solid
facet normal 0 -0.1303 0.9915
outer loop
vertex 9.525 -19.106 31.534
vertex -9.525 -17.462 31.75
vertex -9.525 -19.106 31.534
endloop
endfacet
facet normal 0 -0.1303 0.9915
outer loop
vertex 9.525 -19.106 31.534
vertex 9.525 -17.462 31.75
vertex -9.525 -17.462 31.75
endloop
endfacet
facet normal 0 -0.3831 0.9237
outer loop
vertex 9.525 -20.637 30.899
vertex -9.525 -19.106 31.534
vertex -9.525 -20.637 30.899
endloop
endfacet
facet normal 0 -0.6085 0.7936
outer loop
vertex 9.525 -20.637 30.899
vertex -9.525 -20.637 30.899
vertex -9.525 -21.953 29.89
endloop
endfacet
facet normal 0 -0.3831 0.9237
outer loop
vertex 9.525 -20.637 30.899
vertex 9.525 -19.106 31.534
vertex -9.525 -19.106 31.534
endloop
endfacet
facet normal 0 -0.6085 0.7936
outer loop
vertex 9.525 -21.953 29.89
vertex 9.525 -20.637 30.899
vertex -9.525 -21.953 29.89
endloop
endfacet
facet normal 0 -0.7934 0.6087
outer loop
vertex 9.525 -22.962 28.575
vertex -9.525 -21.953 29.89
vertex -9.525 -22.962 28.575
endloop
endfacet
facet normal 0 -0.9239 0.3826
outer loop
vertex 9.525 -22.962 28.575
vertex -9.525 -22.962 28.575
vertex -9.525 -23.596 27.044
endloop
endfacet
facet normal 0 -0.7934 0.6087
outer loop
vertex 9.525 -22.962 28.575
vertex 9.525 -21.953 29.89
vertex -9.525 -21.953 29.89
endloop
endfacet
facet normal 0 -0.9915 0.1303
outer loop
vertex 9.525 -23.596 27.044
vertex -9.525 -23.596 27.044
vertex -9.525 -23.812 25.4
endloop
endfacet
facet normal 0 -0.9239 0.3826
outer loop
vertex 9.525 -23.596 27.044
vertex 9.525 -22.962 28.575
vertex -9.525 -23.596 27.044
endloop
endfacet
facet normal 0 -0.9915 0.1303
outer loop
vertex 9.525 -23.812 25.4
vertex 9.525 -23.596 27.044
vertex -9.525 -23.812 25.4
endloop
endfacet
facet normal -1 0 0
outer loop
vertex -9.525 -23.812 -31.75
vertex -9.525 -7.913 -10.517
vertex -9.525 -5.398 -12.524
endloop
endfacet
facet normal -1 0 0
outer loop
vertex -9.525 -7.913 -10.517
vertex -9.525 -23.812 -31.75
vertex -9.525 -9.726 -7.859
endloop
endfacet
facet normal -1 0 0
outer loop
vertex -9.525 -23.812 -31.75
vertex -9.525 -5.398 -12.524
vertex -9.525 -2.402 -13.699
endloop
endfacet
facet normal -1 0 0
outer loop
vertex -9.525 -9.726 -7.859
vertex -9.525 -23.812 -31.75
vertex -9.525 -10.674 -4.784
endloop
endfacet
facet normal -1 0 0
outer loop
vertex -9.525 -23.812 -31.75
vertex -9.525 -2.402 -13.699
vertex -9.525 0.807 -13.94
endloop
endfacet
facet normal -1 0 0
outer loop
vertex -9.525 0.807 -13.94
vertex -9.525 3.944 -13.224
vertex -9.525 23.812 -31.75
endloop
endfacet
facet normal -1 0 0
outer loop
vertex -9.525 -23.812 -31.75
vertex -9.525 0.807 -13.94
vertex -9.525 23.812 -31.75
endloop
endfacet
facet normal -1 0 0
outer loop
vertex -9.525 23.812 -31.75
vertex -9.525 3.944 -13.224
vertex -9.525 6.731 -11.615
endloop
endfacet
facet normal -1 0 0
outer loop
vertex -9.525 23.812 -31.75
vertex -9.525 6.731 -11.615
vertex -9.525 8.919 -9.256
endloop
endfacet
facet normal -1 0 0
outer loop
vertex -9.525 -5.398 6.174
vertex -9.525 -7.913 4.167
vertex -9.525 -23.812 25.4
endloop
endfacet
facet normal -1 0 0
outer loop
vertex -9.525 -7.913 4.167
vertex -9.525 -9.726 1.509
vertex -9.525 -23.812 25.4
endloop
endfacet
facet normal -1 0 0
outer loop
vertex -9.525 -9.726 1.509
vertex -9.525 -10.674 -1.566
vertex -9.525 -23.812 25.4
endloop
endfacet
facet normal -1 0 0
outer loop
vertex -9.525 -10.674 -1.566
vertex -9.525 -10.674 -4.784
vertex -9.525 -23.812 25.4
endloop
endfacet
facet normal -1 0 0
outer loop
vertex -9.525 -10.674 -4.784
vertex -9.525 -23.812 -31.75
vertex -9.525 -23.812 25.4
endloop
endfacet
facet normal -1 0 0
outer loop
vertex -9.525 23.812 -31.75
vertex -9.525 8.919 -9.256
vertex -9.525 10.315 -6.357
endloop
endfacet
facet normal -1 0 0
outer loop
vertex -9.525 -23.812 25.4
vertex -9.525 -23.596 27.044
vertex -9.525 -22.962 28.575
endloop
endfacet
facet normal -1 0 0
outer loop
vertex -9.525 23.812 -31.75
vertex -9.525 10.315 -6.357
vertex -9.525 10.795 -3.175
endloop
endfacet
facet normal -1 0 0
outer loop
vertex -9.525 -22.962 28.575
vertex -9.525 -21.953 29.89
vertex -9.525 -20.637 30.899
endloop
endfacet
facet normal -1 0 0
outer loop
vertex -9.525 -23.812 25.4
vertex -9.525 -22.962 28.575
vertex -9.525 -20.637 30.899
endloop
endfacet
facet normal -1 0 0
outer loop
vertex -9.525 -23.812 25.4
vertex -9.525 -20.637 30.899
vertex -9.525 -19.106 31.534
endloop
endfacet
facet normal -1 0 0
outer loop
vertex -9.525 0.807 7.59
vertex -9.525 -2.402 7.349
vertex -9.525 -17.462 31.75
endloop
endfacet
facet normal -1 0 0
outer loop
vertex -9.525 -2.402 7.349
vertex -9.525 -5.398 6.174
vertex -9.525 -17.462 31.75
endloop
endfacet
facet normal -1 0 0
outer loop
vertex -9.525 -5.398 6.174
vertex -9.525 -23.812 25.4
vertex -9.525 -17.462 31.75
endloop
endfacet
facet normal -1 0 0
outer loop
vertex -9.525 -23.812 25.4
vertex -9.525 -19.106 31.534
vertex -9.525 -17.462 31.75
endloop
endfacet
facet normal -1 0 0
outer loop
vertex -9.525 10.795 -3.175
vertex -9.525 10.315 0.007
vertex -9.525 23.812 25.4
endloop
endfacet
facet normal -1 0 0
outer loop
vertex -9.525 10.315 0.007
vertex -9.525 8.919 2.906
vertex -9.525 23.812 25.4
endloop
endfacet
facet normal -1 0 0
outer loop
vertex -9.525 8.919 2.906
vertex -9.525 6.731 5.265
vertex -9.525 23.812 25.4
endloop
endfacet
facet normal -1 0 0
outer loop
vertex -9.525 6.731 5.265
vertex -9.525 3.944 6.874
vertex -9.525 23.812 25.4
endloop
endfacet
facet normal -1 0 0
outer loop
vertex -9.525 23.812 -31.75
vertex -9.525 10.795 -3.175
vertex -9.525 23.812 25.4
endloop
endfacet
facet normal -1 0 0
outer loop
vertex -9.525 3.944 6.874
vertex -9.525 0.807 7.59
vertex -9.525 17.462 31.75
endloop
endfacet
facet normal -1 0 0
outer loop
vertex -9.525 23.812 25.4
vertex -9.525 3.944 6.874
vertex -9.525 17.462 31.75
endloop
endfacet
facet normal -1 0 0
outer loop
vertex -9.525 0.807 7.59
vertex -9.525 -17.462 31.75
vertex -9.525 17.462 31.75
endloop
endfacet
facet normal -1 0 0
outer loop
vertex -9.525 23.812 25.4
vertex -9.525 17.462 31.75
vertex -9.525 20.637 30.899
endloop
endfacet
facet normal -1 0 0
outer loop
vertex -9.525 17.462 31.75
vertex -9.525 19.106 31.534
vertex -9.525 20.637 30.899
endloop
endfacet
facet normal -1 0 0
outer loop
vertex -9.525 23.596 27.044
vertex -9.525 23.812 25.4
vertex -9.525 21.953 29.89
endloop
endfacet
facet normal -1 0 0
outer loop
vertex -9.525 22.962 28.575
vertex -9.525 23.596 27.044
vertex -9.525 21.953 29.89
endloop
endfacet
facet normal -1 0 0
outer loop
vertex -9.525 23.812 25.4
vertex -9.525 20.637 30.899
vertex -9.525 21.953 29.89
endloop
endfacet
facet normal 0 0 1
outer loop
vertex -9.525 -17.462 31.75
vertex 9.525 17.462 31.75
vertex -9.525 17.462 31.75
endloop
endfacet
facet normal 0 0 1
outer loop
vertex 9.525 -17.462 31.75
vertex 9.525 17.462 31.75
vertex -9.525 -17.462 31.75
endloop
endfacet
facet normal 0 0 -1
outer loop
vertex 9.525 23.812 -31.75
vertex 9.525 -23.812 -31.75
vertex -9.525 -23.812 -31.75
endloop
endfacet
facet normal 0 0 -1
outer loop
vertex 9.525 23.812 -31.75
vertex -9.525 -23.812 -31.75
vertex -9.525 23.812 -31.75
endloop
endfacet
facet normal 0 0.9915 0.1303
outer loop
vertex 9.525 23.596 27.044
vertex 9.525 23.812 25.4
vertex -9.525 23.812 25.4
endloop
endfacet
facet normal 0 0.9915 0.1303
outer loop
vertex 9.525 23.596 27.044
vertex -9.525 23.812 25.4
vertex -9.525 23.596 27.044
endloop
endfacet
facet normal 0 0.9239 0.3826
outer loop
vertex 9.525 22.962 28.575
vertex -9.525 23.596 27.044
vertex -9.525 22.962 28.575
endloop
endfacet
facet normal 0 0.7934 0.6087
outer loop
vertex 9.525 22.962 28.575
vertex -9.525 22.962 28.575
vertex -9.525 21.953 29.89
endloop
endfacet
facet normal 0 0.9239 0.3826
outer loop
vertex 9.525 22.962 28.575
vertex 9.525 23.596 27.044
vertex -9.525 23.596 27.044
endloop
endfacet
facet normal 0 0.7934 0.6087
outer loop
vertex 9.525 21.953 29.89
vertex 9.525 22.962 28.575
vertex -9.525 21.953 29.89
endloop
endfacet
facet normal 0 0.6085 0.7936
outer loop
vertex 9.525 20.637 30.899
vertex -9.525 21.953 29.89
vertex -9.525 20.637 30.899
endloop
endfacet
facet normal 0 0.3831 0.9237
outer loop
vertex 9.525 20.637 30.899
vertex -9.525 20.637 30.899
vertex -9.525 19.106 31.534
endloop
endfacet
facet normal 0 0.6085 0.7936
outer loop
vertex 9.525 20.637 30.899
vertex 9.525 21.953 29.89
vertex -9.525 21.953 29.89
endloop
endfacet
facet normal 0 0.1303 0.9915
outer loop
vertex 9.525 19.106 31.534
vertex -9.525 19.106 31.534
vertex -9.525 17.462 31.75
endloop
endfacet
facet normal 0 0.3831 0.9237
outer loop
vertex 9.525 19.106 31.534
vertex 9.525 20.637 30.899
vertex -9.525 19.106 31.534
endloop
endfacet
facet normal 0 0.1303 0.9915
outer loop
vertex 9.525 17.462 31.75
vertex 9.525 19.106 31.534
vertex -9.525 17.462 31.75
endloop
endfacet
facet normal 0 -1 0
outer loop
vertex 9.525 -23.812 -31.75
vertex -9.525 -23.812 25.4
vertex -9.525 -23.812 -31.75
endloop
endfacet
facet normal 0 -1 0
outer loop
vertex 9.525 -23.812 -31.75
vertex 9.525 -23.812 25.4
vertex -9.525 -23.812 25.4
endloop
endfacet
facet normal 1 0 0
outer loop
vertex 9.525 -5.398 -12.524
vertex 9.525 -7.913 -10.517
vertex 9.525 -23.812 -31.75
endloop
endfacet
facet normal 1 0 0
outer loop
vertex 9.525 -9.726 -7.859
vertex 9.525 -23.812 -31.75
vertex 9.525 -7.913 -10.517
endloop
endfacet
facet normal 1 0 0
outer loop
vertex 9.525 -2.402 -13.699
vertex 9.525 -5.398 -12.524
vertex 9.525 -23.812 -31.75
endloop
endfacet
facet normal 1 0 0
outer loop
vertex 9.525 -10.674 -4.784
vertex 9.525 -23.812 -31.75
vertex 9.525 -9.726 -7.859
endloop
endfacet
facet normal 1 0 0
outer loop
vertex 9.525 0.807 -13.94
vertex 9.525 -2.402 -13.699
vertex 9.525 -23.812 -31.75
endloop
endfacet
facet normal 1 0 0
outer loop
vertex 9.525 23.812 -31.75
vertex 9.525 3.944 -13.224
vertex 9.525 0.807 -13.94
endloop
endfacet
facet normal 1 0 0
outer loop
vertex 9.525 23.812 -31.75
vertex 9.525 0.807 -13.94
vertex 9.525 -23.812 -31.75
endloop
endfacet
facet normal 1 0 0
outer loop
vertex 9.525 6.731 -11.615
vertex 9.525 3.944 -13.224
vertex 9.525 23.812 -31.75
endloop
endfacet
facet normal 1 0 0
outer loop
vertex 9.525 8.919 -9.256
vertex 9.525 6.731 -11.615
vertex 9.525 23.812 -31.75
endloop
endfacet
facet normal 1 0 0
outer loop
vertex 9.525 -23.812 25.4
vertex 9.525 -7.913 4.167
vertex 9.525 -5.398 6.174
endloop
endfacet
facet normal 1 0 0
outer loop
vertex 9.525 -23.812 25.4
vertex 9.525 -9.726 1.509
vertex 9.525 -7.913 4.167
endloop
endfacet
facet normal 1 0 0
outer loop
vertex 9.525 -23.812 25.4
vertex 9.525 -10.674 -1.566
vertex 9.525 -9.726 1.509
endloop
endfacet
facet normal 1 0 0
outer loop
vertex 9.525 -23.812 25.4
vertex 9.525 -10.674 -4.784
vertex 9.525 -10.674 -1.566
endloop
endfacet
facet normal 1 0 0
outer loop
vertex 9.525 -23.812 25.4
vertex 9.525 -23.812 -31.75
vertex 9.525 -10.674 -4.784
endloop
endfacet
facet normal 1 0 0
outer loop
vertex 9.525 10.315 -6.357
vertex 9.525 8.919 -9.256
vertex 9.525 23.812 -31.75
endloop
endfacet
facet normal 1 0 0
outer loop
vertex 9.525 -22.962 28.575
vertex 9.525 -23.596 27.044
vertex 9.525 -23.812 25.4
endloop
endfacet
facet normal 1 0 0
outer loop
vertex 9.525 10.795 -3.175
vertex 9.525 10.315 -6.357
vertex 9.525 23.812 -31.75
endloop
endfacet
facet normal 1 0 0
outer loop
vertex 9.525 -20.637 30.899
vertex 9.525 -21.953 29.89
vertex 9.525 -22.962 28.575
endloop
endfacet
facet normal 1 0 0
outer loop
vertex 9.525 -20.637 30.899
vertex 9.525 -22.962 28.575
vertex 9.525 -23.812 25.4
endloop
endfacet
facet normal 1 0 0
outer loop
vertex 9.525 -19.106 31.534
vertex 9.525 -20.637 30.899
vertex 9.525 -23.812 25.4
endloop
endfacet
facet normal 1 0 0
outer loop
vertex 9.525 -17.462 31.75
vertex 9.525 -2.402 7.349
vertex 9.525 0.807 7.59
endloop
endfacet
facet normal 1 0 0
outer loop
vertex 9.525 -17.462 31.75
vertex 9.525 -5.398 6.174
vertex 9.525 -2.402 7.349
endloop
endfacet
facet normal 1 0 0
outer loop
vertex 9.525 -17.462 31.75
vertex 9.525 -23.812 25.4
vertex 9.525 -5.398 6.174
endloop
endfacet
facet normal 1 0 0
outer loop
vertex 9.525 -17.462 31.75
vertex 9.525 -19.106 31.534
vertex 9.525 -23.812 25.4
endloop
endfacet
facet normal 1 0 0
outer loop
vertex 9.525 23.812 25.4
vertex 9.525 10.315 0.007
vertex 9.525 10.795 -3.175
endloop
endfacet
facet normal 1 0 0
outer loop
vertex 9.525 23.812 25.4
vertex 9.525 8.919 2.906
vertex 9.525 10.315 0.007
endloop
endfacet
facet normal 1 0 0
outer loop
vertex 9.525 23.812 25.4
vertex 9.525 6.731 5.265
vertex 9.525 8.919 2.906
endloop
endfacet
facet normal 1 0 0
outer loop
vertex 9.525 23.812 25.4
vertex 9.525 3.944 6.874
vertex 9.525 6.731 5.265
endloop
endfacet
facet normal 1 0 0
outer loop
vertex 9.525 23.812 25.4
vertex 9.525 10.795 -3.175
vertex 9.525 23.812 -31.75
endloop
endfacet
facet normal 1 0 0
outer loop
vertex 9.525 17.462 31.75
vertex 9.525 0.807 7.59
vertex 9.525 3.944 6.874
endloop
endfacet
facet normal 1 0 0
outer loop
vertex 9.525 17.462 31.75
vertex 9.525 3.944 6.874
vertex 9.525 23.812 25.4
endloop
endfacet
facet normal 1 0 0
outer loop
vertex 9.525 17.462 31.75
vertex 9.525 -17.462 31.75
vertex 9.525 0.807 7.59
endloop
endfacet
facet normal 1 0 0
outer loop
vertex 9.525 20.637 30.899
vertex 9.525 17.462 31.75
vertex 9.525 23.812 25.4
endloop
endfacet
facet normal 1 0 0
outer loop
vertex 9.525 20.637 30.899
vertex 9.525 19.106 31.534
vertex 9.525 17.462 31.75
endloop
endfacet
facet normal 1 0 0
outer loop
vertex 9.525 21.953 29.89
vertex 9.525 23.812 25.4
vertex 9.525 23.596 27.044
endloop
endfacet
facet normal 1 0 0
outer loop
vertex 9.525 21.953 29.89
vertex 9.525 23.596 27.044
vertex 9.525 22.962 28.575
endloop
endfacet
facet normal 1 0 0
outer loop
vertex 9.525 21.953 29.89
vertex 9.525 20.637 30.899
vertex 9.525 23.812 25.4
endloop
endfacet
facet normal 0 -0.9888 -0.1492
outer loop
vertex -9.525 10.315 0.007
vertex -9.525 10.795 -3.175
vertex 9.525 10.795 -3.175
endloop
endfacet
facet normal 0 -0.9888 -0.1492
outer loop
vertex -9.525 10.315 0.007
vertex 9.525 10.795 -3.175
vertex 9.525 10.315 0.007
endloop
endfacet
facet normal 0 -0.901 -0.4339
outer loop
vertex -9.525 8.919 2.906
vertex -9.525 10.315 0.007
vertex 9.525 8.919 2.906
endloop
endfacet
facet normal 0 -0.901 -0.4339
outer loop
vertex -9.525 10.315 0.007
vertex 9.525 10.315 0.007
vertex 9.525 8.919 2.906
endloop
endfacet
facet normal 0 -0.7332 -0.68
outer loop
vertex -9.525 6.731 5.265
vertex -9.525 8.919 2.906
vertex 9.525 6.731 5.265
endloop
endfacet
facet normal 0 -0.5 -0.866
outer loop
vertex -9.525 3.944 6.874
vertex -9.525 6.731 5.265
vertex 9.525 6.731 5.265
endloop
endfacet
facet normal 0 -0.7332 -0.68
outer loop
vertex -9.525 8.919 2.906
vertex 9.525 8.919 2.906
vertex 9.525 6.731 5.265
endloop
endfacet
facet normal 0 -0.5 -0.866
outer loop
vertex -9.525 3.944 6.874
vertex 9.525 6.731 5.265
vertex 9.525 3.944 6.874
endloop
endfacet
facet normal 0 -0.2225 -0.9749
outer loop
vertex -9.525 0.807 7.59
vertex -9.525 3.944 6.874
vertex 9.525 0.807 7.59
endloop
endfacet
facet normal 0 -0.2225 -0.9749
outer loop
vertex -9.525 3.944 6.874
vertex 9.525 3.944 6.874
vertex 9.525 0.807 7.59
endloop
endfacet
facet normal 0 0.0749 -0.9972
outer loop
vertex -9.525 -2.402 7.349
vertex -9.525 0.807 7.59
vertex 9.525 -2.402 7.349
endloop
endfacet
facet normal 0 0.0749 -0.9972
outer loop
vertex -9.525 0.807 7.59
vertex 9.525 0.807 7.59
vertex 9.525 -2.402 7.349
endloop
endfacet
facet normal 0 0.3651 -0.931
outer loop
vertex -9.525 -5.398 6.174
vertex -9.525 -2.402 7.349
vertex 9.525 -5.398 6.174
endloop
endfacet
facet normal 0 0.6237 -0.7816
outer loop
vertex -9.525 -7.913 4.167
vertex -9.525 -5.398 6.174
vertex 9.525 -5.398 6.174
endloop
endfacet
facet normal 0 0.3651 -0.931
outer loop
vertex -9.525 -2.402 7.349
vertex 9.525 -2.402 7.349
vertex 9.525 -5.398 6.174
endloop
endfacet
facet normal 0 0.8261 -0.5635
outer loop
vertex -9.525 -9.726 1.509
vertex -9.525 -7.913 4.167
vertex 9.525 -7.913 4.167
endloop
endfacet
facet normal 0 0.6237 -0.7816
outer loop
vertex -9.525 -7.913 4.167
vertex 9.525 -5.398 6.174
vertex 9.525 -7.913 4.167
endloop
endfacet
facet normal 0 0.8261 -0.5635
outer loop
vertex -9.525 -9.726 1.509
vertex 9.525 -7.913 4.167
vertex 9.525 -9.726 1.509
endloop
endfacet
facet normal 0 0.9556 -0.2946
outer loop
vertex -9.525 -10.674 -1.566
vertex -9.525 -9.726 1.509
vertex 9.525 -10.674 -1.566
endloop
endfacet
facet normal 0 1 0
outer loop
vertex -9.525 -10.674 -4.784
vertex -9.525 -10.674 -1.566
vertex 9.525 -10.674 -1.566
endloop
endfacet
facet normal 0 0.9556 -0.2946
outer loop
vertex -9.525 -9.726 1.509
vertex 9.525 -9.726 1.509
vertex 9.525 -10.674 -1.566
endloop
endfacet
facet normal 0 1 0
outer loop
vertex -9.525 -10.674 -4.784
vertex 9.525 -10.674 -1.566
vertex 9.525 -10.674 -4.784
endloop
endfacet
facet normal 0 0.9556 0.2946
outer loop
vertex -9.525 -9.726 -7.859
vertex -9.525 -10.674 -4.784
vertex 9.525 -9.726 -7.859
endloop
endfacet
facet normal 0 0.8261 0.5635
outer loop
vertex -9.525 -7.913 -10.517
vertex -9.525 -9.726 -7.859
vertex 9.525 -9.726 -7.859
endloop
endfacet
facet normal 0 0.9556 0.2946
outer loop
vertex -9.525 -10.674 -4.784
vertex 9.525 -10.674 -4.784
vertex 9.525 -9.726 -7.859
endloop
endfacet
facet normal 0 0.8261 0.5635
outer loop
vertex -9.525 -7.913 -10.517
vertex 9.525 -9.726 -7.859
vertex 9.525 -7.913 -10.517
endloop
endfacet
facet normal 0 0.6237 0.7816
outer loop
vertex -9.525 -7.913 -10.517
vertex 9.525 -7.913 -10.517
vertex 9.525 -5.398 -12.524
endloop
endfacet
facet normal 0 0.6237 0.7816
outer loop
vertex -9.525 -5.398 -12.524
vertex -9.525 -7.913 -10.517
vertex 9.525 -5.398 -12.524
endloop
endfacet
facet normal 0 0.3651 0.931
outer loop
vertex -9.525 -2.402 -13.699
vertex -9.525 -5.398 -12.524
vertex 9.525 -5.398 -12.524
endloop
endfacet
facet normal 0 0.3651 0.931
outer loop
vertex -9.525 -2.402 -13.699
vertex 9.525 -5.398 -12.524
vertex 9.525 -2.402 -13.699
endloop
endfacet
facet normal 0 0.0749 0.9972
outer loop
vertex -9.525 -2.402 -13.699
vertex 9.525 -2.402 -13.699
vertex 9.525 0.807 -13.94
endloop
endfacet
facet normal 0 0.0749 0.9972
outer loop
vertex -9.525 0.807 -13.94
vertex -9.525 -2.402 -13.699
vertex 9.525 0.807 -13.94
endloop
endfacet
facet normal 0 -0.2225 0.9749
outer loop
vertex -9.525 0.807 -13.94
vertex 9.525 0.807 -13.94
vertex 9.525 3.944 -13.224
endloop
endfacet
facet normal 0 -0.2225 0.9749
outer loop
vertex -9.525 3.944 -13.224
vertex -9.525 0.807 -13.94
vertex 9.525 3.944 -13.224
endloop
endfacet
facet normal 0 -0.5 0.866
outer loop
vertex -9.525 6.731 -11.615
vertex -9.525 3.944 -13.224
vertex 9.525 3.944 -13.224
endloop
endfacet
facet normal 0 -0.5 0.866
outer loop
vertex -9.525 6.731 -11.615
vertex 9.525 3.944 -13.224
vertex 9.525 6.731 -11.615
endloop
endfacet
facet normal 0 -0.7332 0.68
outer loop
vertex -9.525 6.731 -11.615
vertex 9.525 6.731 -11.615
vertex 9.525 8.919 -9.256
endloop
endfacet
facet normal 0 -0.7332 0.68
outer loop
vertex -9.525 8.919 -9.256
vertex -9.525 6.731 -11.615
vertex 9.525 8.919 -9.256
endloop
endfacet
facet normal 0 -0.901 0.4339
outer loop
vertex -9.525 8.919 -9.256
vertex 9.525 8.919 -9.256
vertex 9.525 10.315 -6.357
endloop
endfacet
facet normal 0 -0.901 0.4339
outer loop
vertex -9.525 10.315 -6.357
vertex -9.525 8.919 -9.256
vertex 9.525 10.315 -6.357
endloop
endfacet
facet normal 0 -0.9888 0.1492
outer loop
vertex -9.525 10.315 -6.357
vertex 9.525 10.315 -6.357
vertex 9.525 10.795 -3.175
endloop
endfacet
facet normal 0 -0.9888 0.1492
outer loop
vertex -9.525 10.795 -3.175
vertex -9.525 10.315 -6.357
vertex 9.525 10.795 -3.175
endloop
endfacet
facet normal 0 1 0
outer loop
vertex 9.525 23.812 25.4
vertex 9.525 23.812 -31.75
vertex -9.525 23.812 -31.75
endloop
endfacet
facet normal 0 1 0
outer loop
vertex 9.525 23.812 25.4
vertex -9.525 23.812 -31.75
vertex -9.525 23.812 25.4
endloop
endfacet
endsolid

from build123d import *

# Parameters (mm, degrees)
F1_DEPTH = 9.525
F2_R     = 10.795
F3_DEPTH = 25.4


with BuildPart() as f1:
    # F0 (on Right) → F1 (new body, symmetric)
    with BuildSketch(Plane.YZ):
        with BuildLine():
            Line((-23.8125, 25.4), (-23.8125, -31.75))
            Line((-23.8125, -31.75), (23.8125, -31.75))
            Line((23.8125, -31.75), (23.8125, 25.4))
            ThreePointArc((23.8125, 25.4), (21.952628, 29.890128), (17.4625, 31.75))
            Line((17.4625, 31.75), (-17.4625, 31.75))
            ThreePointArc((-17.4625, 31.75), (-21.952628, 29.890128), (-23.8125, 25.4))
        make_face()
    extrude(amount=F1_DEPTH, both=True)

    # F2 (on face) → F3 (cut)
    with BuildSketch(Plane.YZ.offset(9.525)):
        with Locations((0, -3.175)):
            Circle(F2_R)
    extrude(amount=-F3_DEPTH, mode=Mode.SUBTRACT)


solid = f1.part
